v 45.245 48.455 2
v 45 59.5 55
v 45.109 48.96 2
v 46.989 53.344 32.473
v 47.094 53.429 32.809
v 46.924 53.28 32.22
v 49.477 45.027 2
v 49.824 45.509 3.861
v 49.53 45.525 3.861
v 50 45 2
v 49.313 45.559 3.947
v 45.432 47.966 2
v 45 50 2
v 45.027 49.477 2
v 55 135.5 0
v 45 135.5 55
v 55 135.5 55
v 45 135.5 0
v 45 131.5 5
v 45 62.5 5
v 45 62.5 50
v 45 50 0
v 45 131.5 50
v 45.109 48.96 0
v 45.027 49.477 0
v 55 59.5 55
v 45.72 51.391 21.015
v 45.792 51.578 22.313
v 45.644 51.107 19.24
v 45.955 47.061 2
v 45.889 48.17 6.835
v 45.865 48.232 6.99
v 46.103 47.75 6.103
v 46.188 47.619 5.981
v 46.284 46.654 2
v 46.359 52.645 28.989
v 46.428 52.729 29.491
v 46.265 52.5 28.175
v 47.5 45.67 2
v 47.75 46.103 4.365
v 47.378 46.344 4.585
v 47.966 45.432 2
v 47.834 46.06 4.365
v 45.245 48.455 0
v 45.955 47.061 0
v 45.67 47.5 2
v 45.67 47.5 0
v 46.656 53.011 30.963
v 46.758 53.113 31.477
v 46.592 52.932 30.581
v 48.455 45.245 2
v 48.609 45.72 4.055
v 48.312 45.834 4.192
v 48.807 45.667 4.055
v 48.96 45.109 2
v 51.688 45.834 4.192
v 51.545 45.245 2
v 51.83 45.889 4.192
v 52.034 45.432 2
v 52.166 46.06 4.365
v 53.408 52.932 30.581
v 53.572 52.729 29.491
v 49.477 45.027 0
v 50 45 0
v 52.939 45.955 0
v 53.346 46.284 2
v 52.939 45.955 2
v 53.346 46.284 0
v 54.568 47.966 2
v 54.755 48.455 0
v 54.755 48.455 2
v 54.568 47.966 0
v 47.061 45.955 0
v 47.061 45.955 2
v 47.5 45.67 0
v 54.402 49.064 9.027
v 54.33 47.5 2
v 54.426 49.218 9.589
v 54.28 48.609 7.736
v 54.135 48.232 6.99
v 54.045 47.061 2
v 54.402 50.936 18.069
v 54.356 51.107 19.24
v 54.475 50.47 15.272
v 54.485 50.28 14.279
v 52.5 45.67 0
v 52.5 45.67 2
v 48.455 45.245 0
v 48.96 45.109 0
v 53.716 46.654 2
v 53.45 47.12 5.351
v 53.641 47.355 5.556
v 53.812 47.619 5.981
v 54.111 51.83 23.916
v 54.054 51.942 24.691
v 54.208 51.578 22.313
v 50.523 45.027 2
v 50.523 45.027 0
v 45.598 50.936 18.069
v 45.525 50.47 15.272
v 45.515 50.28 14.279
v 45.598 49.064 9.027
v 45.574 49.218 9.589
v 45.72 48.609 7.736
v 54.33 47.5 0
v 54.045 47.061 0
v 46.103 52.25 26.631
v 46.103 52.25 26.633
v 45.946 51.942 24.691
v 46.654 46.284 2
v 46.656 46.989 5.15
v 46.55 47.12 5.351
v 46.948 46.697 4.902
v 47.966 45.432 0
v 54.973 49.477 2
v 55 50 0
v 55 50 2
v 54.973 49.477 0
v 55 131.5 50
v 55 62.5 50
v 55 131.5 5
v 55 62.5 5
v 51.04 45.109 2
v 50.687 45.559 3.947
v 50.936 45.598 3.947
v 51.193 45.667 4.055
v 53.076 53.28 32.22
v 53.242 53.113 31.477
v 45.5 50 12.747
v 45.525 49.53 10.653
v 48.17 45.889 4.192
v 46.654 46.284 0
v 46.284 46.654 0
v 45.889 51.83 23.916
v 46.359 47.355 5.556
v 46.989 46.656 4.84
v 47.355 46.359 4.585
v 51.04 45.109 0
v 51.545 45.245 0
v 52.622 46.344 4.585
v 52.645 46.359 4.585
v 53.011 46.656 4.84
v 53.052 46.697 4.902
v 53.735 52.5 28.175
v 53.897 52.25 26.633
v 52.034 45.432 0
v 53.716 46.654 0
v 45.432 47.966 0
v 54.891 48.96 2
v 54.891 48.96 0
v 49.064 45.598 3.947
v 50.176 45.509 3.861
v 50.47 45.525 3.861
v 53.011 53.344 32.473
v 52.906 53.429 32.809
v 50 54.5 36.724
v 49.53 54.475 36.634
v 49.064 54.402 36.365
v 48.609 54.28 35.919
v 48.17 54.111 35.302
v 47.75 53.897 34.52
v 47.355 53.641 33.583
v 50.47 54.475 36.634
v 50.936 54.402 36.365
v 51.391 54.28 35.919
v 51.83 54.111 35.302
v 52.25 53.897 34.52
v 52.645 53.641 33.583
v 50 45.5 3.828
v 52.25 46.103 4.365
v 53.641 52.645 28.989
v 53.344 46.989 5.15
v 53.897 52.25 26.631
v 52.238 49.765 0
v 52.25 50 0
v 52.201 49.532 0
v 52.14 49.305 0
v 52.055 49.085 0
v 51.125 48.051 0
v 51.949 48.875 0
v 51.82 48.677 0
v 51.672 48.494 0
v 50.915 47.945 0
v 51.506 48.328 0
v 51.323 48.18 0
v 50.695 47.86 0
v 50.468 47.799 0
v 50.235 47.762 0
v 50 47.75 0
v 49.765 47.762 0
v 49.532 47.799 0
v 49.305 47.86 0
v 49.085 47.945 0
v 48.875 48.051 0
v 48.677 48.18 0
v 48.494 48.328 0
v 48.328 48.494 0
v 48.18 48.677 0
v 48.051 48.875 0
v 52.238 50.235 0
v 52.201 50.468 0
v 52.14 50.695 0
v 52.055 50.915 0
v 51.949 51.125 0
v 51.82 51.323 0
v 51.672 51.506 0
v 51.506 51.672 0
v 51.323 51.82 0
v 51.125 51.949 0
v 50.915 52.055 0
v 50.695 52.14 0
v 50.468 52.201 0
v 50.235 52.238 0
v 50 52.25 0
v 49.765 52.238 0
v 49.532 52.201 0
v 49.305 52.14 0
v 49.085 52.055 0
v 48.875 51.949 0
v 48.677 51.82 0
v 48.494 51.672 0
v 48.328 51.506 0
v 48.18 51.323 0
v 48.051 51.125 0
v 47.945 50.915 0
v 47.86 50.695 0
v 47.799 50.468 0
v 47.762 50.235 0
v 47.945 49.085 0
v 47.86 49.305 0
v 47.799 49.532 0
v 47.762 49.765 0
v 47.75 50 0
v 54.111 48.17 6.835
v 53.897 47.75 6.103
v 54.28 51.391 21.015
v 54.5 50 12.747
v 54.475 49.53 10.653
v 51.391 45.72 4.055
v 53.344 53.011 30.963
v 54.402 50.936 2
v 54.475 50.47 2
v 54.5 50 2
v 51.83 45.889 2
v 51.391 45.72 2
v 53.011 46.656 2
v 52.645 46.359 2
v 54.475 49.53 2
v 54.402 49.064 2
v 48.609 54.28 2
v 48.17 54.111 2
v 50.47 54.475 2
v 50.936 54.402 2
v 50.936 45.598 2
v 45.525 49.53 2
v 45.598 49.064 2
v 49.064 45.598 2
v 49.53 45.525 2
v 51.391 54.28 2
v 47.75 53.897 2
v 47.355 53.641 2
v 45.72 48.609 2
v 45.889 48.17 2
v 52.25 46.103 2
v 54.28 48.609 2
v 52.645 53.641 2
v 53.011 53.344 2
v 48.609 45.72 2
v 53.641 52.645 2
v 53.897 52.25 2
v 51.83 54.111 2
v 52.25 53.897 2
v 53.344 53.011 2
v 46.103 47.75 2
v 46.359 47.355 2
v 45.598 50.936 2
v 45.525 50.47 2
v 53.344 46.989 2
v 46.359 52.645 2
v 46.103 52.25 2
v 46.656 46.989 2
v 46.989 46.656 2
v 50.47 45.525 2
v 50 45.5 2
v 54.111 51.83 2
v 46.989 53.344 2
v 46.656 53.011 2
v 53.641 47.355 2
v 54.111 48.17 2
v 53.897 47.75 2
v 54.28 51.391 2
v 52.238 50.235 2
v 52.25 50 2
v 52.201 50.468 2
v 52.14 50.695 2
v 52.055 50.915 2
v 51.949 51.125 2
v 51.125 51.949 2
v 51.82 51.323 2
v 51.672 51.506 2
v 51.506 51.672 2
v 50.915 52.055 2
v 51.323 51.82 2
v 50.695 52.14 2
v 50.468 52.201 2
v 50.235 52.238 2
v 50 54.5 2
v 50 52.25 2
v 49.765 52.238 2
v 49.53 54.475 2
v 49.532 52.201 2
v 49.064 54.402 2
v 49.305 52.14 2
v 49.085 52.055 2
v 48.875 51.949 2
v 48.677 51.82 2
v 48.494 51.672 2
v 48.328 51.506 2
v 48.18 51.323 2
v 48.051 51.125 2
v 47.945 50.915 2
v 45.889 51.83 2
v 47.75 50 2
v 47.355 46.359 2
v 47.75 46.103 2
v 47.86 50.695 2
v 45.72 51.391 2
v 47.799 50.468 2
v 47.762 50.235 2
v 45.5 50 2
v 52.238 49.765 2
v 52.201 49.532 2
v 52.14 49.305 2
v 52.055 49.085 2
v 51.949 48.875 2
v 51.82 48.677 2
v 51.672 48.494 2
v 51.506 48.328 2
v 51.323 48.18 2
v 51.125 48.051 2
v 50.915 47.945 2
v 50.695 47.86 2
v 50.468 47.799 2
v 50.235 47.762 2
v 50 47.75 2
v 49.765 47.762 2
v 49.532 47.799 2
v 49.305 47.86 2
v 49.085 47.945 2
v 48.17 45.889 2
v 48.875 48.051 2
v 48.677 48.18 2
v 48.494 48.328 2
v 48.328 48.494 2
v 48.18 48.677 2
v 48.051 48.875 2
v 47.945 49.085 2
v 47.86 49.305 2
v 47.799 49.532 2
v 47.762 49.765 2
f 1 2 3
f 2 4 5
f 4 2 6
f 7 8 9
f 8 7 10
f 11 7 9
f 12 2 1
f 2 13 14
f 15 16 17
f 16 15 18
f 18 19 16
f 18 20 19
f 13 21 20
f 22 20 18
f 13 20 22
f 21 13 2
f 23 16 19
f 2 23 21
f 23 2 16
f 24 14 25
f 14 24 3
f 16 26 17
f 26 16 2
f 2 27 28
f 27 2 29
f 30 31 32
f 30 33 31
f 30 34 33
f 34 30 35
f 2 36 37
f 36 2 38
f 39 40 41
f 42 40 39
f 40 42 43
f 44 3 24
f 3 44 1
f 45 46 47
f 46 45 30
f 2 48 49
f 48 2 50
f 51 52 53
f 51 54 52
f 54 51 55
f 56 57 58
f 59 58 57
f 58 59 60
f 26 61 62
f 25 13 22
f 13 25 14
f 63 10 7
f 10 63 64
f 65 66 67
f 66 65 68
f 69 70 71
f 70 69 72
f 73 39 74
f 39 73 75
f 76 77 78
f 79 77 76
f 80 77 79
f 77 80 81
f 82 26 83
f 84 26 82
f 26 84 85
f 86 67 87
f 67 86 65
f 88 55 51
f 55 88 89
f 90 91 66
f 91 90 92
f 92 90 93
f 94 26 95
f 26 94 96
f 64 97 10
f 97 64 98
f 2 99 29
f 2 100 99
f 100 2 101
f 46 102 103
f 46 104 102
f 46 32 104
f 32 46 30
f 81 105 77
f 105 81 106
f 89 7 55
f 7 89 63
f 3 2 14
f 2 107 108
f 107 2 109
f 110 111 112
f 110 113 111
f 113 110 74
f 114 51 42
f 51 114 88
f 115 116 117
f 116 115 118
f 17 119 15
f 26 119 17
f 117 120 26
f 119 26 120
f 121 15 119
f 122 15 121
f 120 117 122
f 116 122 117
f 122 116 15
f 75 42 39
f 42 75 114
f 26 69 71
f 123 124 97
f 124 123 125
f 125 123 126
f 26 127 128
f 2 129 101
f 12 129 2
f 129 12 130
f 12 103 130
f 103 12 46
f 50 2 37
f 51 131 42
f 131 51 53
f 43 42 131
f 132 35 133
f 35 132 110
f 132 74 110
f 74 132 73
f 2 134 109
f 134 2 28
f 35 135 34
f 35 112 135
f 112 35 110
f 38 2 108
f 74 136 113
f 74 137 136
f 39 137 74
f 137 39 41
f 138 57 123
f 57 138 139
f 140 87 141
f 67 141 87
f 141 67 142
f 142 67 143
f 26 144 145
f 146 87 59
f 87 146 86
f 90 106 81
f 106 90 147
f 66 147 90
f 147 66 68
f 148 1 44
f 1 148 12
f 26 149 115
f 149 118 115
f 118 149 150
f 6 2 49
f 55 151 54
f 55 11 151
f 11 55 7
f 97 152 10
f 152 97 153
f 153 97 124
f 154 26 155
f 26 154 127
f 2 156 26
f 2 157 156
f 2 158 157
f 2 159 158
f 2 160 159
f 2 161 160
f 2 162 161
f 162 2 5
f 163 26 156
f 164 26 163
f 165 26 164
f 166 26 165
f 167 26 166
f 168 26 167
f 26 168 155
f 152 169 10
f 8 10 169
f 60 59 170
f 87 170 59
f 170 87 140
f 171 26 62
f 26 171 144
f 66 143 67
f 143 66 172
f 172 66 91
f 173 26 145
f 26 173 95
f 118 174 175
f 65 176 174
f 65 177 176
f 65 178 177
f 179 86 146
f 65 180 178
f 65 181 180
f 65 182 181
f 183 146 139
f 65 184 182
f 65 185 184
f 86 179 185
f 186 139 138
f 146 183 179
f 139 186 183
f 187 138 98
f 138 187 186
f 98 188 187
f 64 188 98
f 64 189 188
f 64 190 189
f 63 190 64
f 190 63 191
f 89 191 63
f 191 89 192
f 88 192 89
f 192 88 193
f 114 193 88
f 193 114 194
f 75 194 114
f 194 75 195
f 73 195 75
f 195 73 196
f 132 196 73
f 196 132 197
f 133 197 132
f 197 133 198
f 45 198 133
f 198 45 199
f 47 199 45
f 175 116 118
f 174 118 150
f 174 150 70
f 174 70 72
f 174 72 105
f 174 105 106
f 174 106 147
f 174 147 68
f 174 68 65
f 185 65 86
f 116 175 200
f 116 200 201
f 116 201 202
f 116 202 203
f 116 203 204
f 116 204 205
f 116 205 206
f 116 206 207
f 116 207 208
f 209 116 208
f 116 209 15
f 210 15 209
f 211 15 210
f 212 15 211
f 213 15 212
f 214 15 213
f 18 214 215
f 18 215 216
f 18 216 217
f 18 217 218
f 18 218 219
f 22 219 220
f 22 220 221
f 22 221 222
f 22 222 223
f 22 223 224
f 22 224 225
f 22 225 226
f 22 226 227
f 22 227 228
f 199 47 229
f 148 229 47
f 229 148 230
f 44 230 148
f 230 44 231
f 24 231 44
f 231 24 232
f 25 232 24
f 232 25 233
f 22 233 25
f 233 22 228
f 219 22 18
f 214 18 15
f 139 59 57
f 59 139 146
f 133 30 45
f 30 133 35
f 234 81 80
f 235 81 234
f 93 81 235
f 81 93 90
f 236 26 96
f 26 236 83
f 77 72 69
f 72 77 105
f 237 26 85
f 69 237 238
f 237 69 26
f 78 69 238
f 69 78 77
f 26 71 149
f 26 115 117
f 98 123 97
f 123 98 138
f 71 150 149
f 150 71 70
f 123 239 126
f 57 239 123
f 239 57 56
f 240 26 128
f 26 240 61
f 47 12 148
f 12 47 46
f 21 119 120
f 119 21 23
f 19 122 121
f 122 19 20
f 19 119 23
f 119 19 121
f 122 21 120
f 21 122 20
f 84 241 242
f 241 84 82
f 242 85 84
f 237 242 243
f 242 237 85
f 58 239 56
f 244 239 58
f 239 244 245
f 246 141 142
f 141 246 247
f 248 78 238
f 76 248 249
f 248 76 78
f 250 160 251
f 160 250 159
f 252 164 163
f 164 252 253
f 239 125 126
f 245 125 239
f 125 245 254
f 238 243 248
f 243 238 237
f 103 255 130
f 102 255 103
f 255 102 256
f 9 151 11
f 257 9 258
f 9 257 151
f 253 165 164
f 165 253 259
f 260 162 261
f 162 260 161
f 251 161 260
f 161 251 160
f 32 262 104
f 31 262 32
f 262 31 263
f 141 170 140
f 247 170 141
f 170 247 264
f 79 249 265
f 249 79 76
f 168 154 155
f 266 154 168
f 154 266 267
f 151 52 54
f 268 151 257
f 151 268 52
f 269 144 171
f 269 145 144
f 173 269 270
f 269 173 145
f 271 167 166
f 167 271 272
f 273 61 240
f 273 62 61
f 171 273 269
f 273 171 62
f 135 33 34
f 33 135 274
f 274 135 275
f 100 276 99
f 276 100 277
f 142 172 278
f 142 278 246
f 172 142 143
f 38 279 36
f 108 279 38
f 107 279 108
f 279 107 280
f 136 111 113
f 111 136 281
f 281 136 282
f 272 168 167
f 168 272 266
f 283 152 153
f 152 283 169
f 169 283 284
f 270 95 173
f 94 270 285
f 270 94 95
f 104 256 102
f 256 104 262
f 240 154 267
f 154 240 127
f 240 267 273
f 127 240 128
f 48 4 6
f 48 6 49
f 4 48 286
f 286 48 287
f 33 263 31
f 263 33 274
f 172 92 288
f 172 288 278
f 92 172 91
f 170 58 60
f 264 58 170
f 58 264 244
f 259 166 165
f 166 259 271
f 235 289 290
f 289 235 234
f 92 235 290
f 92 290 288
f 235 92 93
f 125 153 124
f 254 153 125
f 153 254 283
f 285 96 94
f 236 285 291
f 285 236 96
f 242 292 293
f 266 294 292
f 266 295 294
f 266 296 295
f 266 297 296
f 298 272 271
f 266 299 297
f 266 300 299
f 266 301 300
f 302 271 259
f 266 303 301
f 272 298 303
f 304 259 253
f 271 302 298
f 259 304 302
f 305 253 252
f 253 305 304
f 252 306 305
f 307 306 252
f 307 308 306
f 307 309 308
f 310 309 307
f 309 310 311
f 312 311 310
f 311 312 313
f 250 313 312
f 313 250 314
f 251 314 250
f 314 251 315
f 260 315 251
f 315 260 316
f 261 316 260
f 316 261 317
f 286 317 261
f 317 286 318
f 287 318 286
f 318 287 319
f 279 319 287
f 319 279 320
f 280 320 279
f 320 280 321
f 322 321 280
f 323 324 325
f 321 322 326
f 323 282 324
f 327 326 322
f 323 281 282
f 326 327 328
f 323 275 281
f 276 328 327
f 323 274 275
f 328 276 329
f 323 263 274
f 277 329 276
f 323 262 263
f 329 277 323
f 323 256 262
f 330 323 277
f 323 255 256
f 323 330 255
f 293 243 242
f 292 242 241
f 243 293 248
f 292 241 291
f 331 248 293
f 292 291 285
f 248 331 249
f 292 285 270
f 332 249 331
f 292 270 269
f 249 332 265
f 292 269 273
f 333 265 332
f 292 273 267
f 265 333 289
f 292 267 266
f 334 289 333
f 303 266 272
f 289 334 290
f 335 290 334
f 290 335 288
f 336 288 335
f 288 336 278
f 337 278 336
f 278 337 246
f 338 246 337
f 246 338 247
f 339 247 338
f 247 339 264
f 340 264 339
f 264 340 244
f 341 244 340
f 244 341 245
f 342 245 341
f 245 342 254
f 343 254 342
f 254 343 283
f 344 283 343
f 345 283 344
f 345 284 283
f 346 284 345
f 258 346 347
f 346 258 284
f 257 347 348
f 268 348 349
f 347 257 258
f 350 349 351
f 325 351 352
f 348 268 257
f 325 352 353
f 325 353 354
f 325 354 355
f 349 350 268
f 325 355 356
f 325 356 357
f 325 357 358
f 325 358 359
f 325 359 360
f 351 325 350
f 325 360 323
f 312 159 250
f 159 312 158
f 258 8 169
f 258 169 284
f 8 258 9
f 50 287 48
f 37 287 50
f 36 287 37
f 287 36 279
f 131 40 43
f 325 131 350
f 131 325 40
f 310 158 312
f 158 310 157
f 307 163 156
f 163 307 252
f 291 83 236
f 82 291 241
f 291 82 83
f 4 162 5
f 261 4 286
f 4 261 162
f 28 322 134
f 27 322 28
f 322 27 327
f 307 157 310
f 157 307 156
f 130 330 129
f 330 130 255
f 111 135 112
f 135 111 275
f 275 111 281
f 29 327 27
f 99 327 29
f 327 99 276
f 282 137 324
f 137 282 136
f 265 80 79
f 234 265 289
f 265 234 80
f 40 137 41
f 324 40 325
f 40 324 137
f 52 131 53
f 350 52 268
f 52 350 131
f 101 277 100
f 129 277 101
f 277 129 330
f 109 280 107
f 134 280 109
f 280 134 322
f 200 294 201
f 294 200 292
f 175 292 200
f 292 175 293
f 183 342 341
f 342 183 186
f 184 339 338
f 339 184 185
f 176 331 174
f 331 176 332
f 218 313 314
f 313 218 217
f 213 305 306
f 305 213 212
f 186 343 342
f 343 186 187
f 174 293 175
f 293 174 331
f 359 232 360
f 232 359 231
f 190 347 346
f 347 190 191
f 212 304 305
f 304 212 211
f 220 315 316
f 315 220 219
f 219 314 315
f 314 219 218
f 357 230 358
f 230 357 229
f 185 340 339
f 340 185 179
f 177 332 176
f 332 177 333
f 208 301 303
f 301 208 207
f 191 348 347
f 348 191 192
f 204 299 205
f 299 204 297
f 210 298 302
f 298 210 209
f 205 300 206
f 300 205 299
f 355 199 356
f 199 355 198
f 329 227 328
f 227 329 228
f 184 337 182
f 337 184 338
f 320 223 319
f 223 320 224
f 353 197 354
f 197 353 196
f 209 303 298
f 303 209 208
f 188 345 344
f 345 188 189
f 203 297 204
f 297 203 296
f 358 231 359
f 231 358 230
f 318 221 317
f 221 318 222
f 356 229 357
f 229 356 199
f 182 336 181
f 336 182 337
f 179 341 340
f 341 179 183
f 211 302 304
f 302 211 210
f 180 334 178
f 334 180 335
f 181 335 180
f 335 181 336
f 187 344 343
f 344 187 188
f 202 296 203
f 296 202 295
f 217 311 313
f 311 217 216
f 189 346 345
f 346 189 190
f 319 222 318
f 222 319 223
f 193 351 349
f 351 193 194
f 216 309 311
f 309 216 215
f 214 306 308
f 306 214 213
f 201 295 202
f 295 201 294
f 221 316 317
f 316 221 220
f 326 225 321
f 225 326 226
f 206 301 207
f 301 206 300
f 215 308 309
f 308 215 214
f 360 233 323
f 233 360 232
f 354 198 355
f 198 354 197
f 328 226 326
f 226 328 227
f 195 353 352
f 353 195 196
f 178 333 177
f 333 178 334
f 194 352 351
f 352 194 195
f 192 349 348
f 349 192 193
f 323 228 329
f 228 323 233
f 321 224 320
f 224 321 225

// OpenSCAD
$fn=60;
//vesa_mount_holes();

translate([50,50,0]){
    difference(){
        hull(){
            cylinder(d=10, h=2);
            translate([0,10,27.5]) cube([10,1,55], center=true);
            translate([0,85,27.5]) cube([10,1,55], center=true);
        }
        translate([-6,12.5,5]) cube([12,69,45]);
        translate([0,0,2]) cylinder(d=9, h=100);
        translate([0,0,0]) cylinder(d=4.5, h=100, center=true);
    }
}

module vesa_mount_holes(hole_seperation=100, hole_dia=4.5, hole_height=10){
  for(X=[-1,1], Y=[-1,1]){
    translate([hole_seperation/2*X, hole_seperation/2*Y, 0])
      cylinder(d=hole_dia, h=hole_height, center=true);
  }
}
